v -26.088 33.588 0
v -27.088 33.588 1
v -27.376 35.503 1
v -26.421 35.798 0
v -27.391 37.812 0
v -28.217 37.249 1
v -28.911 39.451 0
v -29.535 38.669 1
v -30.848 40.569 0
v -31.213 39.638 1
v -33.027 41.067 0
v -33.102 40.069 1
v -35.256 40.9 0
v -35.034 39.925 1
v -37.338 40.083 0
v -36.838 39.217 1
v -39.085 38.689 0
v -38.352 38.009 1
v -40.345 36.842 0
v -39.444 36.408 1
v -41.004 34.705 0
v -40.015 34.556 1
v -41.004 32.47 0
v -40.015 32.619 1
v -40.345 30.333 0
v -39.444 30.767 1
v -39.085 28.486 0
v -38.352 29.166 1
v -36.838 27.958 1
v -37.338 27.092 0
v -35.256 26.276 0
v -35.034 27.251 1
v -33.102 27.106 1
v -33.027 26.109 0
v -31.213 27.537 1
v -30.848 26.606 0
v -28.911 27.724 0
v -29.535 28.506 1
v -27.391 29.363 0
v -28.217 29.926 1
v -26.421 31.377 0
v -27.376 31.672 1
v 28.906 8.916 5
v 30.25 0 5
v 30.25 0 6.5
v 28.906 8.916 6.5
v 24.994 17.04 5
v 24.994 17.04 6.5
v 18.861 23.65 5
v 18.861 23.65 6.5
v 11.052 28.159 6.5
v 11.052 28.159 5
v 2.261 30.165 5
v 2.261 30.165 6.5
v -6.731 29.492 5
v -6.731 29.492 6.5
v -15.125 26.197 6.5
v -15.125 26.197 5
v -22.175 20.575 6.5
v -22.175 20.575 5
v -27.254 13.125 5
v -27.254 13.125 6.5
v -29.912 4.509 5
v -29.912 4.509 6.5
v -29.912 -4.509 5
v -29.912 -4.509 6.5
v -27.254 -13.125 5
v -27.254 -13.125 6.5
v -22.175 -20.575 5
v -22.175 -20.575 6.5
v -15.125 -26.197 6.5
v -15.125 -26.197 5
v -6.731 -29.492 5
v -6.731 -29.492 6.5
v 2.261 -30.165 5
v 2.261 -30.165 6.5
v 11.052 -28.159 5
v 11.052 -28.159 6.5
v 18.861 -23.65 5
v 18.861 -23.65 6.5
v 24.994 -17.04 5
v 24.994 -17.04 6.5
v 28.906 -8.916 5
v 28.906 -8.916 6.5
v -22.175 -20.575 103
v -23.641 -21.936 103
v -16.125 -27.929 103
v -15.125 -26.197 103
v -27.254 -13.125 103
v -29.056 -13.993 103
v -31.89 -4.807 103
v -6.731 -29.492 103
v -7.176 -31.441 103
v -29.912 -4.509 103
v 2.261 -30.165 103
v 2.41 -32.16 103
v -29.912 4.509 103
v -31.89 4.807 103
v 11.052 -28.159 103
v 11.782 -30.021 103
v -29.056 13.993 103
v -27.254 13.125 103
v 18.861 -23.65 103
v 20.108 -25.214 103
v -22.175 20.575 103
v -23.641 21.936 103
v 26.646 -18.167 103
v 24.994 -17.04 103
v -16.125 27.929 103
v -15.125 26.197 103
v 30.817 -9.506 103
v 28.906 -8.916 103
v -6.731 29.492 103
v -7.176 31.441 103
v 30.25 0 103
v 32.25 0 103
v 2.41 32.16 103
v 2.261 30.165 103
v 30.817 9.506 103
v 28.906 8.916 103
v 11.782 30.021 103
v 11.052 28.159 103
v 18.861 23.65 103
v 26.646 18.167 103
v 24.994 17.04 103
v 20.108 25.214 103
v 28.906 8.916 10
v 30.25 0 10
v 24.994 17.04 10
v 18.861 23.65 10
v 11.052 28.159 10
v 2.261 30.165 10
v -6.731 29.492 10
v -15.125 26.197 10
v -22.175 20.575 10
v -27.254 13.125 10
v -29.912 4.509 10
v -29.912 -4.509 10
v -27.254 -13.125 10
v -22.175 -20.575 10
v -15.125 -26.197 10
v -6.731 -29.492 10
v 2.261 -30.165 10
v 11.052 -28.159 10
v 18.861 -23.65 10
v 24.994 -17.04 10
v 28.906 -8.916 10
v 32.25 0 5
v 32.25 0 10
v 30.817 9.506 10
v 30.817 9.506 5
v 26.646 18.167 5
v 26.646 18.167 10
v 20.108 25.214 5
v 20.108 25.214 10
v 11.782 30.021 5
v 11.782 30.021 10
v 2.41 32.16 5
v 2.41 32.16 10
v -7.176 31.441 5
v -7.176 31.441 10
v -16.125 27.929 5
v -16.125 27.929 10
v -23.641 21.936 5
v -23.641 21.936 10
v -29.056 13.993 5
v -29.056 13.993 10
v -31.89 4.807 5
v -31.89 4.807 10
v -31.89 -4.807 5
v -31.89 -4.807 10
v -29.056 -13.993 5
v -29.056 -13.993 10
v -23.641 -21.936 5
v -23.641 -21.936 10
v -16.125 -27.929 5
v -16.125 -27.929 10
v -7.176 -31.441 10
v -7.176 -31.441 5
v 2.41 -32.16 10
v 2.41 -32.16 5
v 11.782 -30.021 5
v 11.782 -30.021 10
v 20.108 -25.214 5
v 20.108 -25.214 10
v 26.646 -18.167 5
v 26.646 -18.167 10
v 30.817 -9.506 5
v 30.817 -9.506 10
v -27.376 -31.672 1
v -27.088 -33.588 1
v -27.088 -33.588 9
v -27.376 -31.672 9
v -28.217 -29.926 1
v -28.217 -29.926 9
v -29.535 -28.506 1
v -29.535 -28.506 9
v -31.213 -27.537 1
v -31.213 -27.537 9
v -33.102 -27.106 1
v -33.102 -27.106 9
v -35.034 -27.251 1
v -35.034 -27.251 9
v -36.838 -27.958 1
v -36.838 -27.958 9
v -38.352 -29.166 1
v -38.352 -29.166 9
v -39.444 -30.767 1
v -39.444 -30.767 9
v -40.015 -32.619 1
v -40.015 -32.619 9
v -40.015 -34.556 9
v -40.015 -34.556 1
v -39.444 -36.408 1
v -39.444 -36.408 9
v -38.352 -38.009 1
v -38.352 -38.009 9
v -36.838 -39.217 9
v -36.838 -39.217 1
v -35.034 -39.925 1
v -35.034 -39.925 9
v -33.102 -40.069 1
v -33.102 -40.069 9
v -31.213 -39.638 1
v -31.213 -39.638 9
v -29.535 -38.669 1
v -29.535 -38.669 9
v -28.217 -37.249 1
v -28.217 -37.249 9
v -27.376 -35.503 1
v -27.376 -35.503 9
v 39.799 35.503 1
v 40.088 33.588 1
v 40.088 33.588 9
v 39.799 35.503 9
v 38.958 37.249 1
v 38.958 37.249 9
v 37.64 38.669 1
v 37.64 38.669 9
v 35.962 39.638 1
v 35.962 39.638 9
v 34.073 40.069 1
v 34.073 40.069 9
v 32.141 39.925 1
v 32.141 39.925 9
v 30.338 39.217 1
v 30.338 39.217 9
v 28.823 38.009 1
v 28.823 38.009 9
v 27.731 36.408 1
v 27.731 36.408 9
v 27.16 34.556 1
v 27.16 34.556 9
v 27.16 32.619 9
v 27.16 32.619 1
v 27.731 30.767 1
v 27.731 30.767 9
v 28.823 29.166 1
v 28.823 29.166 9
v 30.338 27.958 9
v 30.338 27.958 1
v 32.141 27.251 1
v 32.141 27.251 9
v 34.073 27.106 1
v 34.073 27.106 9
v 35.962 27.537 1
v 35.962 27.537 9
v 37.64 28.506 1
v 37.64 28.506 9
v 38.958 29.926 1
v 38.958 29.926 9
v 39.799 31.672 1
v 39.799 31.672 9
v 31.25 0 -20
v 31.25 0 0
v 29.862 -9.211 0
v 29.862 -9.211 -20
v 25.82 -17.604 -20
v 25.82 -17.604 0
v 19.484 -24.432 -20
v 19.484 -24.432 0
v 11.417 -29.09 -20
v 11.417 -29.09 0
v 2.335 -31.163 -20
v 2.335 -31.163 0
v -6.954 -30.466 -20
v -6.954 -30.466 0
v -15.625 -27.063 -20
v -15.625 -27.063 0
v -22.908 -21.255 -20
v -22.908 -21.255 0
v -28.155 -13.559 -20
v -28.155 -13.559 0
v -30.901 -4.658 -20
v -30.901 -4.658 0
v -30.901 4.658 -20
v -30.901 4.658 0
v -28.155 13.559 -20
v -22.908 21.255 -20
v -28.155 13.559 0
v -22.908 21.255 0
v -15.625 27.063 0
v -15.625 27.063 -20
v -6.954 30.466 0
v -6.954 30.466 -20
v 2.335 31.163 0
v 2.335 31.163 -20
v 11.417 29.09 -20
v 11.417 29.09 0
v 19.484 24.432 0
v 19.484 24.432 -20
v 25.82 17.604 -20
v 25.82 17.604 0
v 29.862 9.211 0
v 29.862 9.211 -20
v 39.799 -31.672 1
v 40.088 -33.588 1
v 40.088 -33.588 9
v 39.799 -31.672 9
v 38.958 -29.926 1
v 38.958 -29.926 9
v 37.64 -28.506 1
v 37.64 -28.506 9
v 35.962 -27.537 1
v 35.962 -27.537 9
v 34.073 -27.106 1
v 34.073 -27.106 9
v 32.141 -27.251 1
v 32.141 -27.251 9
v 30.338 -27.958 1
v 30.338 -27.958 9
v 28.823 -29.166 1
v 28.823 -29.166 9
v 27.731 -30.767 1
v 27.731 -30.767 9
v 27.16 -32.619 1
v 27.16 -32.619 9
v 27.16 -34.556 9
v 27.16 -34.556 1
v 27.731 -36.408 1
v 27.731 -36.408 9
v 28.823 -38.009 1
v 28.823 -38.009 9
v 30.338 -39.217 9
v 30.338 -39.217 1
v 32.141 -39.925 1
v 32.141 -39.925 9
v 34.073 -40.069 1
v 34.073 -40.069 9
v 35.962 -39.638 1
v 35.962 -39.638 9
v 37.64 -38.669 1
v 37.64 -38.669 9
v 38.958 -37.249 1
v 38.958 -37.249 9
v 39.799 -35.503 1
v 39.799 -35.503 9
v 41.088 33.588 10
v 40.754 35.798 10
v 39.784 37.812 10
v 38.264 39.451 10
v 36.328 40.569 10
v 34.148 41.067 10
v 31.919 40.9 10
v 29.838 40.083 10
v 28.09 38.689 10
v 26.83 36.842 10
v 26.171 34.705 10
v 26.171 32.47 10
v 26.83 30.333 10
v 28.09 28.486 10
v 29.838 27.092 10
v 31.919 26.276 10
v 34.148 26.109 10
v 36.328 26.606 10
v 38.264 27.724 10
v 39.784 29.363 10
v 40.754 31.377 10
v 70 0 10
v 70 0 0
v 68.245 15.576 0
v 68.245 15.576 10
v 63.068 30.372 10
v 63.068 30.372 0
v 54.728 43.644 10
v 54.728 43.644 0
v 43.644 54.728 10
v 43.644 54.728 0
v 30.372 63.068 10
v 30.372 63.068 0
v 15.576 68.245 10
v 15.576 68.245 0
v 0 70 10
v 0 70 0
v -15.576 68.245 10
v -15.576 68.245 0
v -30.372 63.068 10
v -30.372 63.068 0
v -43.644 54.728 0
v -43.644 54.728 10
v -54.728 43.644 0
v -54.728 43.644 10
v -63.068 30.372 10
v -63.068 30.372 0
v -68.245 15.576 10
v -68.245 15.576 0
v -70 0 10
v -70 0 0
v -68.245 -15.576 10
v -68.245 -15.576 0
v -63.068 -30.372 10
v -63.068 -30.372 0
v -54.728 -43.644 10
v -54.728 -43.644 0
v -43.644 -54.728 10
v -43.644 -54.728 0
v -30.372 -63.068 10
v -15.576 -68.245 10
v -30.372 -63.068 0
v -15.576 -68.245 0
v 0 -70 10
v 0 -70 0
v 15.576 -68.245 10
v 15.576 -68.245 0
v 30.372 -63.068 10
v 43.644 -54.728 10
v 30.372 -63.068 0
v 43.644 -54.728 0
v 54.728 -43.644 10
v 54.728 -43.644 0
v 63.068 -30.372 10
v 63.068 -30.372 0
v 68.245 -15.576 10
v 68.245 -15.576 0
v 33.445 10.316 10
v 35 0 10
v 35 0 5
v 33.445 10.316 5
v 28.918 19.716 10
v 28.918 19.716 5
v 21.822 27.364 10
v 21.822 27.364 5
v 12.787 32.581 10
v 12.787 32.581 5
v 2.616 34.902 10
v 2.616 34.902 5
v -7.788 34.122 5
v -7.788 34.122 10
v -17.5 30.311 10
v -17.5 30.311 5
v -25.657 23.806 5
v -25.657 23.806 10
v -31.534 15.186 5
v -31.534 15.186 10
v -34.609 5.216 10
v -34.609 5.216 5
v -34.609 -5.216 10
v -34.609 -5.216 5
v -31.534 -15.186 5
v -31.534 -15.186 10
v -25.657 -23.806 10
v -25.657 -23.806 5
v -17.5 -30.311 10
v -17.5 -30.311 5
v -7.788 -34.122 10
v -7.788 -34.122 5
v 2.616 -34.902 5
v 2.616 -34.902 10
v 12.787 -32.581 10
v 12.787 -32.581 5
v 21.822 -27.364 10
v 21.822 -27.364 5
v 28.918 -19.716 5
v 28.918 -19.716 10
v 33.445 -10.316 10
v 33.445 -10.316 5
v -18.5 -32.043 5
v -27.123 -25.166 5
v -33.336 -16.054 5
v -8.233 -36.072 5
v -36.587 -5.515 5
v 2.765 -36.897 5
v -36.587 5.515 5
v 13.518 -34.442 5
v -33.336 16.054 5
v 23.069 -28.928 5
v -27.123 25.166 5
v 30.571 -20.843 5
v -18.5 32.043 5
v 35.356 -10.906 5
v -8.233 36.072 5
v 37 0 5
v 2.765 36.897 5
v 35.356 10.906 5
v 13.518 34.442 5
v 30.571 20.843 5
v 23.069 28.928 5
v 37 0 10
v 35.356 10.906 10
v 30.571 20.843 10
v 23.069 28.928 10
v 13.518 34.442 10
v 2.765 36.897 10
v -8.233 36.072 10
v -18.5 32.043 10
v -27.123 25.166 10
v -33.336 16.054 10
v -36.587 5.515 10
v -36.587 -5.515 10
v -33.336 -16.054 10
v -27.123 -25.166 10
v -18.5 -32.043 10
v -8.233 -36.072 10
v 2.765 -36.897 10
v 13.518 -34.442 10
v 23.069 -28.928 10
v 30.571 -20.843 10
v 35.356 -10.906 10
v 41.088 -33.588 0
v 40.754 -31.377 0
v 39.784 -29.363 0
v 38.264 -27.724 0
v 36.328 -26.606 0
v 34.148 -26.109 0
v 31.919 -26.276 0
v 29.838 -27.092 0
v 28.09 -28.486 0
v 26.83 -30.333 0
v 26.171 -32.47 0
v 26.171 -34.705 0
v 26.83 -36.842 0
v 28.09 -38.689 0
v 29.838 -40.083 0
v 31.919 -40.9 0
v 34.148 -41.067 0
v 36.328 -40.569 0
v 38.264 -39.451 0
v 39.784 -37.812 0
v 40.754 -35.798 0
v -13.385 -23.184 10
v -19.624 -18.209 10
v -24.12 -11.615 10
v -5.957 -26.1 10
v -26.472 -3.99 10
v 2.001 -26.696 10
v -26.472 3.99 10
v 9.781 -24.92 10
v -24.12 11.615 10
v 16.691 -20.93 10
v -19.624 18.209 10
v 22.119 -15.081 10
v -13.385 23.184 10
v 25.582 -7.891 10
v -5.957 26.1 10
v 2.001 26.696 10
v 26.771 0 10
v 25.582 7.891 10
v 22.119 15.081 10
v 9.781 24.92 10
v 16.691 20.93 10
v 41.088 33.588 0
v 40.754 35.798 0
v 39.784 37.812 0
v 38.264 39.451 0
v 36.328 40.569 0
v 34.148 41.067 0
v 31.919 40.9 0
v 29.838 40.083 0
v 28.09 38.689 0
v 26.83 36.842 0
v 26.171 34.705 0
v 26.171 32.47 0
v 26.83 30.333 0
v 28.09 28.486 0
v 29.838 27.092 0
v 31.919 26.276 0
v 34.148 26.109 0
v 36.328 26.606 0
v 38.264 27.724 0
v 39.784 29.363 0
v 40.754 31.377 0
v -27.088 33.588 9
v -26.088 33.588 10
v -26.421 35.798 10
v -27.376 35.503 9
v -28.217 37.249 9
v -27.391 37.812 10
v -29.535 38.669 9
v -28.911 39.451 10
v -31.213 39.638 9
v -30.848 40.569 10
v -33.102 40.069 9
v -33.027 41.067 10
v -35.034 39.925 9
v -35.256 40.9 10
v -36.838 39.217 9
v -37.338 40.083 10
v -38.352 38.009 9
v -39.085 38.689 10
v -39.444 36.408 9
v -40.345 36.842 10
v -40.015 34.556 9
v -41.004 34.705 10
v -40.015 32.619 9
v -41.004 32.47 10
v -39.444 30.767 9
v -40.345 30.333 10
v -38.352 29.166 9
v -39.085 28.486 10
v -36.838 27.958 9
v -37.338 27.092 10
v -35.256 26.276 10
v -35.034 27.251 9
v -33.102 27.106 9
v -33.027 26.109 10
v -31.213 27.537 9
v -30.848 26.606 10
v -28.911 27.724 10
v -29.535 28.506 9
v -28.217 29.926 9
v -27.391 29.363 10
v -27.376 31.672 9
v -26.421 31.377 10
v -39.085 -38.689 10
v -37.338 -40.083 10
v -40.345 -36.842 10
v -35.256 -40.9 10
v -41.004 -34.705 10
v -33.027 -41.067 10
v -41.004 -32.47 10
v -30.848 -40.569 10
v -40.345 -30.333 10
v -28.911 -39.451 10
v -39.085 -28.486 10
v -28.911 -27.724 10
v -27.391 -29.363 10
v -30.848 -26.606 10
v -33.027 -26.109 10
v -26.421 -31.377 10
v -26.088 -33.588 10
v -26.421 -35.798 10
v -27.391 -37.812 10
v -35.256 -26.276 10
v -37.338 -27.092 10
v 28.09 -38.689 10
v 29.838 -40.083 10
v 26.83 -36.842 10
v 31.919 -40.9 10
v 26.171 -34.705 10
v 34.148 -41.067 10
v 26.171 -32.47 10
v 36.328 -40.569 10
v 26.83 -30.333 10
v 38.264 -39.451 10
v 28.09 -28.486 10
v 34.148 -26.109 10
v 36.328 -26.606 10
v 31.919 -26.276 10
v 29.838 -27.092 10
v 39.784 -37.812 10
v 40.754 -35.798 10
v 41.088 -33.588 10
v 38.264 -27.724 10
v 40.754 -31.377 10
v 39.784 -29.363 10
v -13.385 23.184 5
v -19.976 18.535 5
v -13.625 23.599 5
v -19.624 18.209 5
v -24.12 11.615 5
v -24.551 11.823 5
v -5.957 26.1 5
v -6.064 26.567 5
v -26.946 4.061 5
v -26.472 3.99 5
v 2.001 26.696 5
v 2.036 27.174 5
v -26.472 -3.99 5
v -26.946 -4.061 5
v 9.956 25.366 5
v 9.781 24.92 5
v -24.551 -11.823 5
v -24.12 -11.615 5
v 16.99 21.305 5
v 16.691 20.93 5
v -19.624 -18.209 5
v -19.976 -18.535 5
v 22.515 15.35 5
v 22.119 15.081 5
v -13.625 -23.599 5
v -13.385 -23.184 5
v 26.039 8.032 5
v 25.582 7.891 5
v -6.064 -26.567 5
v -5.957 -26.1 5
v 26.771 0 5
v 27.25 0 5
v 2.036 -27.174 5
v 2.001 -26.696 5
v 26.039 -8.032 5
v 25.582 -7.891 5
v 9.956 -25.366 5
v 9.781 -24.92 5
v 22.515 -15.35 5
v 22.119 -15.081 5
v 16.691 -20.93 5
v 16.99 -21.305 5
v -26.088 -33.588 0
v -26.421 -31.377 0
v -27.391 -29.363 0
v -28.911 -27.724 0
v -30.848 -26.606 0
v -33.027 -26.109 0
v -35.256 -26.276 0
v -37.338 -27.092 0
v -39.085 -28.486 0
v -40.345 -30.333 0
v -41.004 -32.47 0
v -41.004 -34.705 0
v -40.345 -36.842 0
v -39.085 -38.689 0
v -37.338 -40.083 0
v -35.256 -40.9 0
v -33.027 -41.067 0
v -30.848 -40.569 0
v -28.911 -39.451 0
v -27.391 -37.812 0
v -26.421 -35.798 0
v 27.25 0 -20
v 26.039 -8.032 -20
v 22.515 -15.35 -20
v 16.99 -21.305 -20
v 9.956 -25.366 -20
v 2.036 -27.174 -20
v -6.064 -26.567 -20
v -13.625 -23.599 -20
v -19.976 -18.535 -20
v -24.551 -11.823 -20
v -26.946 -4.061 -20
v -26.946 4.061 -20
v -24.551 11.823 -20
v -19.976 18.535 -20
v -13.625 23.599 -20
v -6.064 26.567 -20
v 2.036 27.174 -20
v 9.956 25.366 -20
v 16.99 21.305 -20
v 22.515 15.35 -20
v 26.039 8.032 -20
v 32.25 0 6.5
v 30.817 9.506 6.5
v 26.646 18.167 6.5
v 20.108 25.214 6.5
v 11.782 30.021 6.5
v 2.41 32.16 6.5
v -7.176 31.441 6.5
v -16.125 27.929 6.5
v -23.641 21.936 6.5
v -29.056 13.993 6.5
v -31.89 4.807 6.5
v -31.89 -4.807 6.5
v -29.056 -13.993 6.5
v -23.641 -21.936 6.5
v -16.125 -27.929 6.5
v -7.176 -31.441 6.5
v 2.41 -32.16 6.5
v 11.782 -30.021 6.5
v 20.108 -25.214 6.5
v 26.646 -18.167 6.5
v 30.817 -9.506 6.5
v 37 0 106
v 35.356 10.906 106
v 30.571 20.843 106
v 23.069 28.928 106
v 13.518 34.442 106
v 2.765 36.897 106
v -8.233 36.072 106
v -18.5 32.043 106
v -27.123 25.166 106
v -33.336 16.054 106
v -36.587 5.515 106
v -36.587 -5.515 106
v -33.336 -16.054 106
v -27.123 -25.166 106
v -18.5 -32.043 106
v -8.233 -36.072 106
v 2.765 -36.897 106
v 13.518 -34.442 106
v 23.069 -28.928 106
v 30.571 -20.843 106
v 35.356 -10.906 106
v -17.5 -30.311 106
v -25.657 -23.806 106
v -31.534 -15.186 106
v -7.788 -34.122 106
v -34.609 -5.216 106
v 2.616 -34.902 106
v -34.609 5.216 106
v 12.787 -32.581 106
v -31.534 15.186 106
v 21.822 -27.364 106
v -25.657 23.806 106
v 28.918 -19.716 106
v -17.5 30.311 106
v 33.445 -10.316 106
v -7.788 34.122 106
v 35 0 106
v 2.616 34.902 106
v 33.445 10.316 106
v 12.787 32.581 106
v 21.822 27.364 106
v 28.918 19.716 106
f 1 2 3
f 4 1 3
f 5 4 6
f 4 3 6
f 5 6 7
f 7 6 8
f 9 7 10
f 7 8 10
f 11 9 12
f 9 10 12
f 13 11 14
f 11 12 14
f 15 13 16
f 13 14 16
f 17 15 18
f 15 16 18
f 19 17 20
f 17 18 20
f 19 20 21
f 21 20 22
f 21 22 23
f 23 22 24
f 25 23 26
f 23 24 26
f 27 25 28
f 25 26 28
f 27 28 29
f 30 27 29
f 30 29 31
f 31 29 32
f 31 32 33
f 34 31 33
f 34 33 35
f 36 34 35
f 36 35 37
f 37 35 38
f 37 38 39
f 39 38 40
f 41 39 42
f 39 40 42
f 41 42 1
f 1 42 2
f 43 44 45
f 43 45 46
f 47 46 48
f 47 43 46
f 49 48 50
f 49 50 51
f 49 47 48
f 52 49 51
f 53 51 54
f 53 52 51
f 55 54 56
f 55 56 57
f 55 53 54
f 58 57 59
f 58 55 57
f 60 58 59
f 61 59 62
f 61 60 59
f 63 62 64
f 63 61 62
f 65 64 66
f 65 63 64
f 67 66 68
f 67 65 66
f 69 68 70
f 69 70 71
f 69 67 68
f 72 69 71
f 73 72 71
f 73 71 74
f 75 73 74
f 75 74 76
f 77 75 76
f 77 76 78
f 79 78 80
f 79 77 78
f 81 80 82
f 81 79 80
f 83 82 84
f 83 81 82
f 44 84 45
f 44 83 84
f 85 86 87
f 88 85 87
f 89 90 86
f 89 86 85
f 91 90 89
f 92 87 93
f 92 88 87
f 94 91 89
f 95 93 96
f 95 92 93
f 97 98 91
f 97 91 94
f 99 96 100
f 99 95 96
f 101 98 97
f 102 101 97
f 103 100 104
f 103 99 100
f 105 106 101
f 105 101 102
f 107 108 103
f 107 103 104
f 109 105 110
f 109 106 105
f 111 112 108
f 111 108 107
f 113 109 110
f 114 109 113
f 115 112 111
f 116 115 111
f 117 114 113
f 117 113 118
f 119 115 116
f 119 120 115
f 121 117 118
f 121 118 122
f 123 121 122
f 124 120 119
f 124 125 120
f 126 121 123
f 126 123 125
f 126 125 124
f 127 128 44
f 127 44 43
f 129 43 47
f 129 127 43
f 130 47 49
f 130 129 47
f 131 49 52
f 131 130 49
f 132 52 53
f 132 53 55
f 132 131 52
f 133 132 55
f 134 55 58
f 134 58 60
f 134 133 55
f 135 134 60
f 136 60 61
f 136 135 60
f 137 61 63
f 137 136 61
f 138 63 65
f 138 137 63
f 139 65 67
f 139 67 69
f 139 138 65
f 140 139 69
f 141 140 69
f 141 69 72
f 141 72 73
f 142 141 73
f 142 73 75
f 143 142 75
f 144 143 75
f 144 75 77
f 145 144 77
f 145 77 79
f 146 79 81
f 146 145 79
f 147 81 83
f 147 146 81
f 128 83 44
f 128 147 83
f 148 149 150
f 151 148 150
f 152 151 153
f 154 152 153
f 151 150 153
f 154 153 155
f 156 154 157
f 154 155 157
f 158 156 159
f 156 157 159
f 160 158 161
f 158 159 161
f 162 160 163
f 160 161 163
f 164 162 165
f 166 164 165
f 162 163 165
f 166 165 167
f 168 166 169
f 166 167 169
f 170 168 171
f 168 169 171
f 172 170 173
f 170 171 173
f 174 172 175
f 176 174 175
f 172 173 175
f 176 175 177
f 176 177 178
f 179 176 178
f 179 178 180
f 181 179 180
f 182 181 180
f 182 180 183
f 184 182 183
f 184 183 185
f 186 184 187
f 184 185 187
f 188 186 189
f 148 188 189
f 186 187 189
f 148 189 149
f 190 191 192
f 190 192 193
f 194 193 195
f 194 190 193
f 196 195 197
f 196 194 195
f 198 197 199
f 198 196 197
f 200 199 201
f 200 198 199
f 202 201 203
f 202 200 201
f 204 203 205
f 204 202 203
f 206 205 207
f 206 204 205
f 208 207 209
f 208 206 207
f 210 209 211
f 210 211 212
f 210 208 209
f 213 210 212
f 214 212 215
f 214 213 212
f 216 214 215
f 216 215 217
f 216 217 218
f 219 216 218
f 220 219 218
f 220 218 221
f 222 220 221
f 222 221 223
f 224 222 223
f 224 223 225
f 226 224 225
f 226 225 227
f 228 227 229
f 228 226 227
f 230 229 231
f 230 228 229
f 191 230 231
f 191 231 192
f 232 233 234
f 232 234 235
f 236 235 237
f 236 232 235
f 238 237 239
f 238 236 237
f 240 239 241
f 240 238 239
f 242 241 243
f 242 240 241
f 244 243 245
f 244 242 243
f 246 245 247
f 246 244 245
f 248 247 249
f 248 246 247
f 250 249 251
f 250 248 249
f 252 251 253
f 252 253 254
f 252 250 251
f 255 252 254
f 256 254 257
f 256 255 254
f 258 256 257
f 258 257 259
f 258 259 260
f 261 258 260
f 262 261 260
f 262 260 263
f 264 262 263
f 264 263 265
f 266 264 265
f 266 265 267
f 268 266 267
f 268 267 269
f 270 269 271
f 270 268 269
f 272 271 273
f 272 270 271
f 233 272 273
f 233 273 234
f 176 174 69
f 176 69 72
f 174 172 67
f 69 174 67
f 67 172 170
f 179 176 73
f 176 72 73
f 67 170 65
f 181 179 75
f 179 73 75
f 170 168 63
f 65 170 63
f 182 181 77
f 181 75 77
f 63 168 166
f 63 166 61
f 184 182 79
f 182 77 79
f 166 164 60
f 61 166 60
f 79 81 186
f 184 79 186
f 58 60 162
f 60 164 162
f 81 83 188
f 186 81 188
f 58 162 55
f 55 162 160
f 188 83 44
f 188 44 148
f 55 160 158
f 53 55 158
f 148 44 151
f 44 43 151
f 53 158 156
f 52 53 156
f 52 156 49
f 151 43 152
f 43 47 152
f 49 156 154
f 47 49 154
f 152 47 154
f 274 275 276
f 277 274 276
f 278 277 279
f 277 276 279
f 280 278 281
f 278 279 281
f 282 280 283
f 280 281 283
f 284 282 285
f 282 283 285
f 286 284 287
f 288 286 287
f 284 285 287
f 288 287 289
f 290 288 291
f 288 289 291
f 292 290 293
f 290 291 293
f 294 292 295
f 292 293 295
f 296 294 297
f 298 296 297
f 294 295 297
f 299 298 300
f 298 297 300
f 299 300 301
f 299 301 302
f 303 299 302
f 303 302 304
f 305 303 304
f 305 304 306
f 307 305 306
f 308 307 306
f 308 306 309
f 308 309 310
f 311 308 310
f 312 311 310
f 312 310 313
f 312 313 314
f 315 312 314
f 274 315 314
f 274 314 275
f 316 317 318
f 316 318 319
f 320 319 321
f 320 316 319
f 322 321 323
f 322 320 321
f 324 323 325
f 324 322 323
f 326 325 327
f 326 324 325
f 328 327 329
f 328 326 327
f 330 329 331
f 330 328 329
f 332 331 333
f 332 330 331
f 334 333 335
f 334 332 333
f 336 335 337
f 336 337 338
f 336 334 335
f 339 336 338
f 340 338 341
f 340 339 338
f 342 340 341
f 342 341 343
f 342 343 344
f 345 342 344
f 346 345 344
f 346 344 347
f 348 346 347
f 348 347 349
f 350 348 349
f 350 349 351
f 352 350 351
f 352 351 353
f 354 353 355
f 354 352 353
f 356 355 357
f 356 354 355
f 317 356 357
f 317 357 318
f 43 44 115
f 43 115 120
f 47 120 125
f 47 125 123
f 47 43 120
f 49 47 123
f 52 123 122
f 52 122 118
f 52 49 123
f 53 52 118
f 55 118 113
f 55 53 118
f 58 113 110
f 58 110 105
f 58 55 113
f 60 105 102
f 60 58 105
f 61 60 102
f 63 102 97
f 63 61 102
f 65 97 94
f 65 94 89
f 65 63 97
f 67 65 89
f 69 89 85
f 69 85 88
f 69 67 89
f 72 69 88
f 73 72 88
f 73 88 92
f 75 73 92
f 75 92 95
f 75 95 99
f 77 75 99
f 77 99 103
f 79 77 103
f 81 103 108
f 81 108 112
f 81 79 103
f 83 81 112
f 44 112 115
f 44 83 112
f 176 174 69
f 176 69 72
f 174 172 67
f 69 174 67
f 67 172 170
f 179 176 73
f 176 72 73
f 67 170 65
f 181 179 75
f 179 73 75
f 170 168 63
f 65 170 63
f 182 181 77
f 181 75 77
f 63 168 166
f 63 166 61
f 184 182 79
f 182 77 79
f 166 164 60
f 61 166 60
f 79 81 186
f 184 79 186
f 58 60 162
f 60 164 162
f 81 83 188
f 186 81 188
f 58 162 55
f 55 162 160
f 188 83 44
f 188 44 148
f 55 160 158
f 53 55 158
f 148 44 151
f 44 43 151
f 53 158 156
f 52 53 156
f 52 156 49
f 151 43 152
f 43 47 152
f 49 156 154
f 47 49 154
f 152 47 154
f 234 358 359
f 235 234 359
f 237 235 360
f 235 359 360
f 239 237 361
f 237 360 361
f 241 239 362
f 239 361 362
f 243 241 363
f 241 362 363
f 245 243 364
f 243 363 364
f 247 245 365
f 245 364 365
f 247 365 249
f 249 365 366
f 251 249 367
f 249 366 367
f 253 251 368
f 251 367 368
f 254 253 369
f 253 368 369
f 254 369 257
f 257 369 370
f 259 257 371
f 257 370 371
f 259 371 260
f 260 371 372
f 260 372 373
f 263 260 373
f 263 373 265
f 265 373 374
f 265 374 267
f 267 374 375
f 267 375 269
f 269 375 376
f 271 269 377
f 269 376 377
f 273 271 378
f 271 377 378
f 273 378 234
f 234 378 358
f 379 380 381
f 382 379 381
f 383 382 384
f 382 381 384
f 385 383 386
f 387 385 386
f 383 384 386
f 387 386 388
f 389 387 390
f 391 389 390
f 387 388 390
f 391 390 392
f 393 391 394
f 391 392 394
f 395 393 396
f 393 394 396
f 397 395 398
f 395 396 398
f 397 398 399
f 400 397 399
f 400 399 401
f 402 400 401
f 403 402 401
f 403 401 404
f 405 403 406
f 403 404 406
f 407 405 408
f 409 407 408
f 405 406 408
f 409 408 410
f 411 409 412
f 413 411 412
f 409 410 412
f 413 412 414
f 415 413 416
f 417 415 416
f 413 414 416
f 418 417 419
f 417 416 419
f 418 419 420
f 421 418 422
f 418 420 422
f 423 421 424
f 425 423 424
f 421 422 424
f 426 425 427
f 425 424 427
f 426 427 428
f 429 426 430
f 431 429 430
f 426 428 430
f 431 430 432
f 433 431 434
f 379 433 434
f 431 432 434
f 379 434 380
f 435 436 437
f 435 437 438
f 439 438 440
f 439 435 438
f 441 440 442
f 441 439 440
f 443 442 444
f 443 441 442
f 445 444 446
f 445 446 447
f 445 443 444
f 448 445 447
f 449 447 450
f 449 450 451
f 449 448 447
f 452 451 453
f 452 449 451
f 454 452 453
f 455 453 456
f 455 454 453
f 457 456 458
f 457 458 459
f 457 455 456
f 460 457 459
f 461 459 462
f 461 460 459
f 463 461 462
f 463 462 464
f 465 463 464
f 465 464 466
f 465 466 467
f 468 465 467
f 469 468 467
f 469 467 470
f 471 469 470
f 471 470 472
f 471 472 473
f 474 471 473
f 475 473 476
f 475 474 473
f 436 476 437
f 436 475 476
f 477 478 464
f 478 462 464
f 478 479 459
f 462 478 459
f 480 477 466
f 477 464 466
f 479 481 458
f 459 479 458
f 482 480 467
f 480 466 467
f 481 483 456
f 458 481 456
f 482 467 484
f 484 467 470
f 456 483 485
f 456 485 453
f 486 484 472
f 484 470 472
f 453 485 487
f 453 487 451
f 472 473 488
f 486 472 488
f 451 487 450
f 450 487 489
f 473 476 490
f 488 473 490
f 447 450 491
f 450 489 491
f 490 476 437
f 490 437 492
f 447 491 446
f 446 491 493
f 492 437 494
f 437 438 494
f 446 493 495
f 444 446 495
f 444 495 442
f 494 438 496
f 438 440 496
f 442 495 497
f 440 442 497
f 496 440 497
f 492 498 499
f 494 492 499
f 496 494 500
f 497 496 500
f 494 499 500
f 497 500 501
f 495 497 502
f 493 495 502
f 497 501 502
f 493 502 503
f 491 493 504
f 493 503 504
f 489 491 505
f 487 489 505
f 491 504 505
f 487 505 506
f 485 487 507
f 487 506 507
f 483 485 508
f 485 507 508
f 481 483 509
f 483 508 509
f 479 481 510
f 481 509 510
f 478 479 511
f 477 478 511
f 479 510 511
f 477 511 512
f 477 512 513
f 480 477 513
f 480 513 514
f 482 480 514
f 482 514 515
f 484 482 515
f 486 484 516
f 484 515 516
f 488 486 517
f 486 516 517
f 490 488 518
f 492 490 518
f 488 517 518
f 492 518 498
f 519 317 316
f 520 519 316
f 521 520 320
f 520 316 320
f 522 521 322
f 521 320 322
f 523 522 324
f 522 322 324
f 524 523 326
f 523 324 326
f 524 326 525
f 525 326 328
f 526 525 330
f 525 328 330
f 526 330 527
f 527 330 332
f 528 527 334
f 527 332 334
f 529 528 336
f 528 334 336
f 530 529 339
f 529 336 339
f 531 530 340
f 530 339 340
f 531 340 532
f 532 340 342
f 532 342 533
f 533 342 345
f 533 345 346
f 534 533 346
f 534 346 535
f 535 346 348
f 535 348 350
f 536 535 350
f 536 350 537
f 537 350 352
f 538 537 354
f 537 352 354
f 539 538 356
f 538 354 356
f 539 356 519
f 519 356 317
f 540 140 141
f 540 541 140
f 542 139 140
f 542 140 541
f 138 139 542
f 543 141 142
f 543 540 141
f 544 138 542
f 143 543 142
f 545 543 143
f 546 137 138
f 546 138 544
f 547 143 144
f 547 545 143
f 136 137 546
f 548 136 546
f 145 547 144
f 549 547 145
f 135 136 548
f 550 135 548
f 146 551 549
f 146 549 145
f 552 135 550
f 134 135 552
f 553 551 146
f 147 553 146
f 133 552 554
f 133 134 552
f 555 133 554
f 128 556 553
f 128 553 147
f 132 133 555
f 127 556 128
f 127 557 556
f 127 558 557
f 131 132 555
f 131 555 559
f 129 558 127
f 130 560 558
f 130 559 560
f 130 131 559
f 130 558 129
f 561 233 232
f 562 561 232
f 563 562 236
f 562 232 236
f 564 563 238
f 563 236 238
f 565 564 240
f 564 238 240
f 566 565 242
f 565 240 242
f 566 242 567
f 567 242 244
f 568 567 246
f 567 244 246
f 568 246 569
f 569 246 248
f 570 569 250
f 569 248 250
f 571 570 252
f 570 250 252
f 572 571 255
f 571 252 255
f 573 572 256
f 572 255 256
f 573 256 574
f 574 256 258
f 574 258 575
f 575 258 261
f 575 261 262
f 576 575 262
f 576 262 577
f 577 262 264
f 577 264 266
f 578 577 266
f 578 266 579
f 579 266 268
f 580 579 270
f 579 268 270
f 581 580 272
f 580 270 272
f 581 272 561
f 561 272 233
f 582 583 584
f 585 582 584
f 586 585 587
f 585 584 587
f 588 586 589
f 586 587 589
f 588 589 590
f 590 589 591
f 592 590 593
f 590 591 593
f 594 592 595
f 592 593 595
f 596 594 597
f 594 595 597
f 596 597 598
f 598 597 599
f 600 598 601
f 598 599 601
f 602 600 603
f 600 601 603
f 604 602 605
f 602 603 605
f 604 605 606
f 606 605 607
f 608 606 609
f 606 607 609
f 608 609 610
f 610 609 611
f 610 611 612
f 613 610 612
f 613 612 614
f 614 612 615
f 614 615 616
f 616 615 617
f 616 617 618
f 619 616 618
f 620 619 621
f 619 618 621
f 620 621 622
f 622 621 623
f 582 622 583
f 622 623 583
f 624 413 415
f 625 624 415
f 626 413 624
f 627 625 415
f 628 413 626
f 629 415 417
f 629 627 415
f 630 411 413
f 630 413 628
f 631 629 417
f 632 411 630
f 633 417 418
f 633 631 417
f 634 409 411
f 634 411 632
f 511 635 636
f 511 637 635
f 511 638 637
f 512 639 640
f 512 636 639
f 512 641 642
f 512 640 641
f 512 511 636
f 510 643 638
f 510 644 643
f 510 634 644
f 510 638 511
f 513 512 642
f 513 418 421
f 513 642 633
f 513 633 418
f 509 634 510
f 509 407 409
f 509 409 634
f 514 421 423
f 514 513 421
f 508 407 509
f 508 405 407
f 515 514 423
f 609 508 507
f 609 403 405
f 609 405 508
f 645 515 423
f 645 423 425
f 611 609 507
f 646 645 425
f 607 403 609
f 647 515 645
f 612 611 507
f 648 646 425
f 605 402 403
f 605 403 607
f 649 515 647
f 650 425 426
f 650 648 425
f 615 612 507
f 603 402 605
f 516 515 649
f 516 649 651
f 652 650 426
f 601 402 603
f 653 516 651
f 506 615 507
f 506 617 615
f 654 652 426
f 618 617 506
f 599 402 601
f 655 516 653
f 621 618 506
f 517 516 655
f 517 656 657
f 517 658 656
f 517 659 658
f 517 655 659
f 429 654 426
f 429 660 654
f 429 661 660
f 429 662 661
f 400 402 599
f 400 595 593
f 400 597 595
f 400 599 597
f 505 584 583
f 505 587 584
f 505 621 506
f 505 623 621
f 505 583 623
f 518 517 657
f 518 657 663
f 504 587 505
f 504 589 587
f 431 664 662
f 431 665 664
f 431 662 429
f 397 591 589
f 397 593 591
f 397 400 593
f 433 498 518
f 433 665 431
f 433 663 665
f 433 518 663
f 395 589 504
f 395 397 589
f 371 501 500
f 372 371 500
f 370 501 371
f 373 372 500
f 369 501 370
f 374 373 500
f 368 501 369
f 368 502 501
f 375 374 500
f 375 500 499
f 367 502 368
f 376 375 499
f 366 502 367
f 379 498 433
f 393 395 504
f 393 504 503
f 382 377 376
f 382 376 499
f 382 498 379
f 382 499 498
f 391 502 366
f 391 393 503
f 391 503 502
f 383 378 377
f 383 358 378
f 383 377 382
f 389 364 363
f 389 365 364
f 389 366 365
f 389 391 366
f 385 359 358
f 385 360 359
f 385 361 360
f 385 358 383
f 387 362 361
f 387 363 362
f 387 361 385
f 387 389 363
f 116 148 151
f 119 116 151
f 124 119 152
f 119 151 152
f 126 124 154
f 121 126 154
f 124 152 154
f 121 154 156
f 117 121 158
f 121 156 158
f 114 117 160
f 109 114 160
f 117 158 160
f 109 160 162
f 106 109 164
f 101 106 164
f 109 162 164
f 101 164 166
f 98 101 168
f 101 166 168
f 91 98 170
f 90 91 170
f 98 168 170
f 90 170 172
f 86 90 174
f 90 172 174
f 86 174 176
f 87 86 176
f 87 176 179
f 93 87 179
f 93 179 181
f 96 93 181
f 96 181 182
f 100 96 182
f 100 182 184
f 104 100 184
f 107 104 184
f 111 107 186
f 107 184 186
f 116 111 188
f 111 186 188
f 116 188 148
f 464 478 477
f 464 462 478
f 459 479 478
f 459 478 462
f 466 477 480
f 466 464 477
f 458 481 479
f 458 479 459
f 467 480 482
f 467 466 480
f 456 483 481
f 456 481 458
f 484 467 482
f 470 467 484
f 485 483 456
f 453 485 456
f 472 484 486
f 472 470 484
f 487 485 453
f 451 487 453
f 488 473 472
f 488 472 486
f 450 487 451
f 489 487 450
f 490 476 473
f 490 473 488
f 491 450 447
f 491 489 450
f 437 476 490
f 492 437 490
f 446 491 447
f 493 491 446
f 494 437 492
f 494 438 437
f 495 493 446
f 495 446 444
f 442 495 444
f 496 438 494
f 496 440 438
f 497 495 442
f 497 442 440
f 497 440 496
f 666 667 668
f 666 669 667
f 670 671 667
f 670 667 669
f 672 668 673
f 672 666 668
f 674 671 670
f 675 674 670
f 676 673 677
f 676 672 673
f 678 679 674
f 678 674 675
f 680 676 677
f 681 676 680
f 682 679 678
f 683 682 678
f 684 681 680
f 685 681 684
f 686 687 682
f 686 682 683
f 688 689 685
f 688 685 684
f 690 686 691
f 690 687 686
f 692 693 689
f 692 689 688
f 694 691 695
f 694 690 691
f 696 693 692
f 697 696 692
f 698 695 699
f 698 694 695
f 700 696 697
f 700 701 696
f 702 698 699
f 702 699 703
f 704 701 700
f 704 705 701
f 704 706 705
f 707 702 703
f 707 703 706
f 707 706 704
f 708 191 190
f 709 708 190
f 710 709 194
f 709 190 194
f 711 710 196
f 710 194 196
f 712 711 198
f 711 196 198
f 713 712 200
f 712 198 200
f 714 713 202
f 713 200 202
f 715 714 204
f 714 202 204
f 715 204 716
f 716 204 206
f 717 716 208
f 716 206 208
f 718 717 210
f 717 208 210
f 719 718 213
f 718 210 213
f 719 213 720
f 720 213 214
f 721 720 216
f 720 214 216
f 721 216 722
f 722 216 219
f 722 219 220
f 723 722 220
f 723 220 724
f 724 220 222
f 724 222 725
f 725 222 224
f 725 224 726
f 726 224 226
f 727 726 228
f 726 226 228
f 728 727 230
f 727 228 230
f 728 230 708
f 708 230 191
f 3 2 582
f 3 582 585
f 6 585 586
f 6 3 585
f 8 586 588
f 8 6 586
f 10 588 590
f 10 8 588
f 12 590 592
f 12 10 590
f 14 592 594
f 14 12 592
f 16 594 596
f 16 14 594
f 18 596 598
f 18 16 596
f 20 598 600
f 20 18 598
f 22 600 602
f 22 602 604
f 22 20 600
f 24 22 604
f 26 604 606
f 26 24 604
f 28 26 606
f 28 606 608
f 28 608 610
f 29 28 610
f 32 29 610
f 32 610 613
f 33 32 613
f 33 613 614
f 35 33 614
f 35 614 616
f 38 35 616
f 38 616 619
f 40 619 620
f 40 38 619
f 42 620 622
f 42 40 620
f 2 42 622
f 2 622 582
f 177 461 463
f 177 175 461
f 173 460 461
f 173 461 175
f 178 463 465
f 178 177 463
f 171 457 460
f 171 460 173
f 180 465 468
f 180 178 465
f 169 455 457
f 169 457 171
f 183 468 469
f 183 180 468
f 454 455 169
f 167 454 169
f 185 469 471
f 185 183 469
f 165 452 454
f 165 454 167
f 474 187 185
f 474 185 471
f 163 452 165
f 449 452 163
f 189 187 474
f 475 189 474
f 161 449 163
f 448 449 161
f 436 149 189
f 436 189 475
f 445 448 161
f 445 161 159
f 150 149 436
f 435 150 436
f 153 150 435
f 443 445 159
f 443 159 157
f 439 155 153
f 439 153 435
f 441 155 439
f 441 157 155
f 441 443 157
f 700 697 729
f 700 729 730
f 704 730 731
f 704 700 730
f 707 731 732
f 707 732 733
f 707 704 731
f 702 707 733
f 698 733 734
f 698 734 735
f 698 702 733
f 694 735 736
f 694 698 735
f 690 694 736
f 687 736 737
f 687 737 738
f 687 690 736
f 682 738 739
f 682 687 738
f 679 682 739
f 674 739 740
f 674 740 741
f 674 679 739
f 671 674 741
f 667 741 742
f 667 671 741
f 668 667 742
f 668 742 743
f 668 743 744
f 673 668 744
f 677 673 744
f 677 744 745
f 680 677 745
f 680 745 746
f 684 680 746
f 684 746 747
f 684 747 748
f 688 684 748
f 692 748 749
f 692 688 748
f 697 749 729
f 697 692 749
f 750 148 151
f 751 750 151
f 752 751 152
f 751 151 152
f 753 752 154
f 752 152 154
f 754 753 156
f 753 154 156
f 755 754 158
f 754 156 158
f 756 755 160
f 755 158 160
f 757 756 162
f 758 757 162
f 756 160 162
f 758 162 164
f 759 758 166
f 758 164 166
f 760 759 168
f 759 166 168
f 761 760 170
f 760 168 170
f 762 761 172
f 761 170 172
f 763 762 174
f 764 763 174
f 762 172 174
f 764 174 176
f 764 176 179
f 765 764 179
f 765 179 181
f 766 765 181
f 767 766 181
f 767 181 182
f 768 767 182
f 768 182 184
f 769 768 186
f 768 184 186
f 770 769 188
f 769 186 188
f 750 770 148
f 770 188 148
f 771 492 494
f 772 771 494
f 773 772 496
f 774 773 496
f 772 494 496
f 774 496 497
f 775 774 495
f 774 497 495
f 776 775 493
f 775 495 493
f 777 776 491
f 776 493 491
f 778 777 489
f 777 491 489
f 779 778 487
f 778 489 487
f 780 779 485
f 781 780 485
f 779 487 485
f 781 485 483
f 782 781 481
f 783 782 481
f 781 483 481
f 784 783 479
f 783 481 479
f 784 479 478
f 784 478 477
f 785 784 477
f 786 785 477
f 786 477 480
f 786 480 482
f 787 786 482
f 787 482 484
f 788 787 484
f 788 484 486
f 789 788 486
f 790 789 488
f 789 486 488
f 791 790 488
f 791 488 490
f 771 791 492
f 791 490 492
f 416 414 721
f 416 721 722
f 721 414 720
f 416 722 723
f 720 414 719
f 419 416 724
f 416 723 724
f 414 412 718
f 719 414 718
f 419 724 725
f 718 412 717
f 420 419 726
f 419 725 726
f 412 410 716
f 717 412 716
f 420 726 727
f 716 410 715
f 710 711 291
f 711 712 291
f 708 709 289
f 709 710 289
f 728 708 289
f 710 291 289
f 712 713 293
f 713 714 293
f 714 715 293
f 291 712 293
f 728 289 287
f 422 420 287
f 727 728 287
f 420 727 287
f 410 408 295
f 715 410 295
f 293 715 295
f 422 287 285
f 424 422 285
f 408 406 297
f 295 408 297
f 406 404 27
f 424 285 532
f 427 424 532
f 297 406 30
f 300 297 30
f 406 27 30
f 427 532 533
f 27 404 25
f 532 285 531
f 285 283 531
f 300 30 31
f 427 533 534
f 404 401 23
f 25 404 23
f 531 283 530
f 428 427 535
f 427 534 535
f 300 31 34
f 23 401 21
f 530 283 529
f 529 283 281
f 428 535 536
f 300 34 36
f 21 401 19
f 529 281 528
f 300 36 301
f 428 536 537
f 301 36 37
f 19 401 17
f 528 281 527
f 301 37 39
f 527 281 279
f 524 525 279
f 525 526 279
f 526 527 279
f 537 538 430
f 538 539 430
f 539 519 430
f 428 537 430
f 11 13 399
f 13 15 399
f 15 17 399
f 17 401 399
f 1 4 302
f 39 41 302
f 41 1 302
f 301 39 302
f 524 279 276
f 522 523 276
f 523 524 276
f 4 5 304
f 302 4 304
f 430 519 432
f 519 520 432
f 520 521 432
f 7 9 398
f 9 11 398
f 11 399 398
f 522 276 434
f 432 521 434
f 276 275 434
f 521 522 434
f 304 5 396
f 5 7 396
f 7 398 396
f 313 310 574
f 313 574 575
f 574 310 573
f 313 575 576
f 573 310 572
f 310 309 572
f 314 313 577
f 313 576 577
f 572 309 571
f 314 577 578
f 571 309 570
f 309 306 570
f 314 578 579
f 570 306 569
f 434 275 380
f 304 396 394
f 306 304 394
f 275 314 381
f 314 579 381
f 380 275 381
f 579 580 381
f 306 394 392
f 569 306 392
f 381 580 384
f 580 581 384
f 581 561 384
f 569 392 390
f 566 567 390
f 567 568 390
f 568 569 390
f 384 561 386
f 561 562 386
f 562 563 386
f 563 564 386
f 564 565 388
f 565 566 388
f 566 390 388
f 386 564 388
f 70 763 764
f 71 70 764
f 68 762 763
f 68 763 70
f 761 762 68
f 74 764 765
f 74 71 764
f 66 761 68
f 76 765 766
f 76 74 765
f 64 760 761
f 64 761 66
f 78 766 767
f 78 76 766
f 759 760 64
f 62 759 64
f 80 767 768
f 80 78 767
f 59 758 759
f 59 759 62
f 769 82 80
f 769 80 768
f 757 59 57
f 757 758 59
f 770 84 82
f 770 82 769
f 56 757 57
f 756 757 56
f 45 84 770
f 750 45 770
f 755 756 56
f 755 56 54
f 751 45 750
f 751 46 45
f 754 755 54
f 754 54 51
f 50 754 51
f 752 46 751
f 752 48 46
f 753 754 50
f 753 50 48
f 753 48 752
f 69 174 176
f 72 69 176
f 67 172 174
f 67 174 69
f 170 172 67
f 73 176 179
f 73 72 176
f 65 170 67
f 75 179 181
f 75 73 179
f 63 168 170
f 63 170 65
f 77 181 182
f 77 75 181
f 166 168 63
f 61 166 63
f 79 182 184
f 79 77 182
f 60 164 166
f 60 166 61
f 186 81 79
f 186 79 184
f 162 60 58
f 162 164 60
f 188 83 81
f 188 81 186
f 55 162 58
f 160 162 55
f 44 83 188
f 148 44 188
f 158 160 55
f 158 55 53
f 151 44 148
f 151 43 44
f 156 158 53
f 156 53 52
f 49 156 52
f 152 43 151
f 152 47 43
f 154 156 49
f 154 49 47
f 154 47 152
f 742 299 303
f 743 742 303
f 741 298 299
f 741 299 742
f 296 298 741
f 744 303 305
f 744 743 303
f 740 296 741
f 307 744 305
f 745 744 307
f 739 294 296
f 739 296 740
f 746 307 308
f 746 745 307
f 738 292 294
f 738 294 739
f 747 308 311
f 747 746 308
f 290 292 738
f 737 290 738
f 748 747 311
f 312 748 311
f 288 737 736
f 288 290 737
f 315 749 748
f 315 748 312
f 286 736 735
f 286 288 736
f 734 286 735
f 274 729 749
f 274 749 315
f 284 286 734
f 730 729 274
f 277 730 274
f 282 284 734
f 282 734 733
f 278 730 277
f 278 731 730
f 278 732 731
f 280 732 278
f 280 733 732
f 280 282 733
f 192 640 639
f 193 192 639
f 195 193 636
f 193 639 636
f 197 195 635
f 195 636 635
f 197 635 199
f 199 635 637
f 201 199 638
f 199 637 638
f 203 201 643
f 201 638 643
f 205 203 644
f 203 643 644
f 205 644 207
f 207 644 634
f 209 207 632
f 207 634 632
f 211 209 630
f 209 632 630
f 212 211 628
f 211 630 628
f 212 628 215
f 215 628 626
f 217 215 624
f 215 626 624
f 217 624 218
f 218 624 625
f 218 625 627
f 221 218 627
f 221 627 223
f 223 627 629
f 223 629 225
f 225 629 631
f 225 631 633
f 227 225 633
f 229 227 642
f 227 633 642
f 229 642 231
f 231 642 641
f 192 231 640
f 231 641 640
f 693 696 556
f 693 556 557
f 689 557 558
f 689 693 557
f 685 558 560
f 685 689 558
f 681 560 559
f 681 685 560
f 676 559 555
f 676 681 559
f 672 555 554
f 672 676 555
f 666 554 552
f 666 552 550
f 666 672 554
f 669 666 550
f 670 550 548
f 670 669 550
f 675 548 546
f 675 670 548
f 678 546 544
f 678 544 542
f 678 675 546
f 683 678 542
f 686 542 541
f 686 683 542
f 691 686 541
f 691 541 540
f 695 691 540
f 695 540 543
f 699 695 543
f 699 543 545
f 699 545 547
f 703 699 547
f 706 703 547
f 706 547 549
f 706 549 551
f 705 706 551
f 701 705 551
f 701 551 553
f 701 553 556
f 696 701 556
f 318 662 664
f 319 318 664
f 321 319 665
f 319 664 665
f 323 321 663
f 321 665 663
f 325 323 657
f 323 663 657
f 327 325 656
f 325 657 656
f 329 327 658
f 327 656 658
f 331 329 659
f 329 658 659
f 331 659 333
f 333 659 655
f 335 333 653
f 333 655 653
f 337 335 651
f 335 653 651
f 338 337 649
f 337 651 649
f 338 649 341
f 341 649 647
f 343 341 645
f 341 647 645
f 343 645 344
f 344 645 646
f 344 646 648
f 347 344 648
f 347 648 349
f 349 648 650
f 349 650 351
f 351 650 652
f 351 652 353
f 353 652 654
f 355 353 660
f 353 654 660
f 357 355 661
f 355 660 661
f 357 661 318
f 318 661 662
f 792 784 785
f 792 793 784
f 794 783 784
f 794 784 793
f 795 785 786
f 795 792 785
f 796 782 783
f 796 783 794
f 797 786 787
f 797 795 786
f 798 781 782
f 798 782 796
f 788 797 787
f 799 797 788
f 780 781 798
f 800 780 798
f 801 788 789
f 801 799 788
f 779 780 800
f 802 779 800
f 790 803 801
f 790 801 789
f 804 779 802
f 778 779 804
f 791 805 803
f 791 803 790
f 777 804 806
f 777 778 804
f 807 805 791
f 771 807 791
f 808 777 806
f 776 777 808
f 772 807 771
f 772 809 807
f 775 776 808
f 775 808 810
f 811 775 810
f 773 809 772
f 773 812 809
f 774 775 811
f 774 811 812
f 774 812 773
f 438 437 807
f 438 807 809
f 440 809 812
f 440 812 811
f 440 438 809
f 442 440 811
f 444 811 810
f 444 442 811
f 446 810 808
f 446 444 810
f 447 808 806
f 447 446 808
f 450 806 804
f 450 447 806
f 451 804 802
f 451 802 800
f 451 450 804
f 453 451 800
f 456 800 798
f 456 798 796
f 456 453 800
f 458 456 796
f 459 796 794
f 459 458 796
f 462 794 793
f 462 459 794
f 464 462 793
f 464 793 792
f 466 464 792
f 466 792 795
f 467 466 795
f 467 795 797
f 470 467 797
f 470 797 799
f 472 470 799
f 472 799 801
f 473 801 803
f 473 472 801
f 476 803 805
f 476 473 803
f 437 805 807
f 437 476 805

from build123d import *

# Parameters (mm, degrees)
F0_R      = 70
F0_R_2    = 6.5
F0_R_3    = 26.7709117697
F1_DEPTH  = 10
F2_R      = 30.15
F3_DEPTH  = 5
F4_R      = 31.25
F4_R_2    = 27.25
F5_DEPTH  = 25
F6_SIZE   = 1
F7_R      = 32.25
F7_R_2    = 30.25
F8_DEPTH  = 5
F9_R      = 37
F9_R_2    = 35
F10_DEPTH = 5
F11_R     = 32.25
F11_R_2   = 30.25
F12_DEPTH = 98
F13_R     = 37
F13_R_2   = 35
F14_DEPTH = 101
F15_R     = 32.25
F15_R_2   = 30.25
F16_DEPTH = 1.5


with BuildPart() as f1:
    # F0 (on Top) → F1 (new body)
    with BuildSketch(Plane.XY):
        Circle(F0_R)
        with Locations((-33.5875721064, -33.5875721064)):
            Circle(F0_R_2, mode=Mode.SUBTRACT)
        with Locations((33.5875721064, -33.5875721064)):
            Circle(F0_R_2, mode=Mode.SUBTRACT)
        with Locations((-33.5875721064, 33.5875721064)):
            Circle(F0_R_2, mode=Mode.SUBTRACT)
        Circle(F0_R_3, mode=Mode.SUBTRACT)
        with Locations((33.5875721064, 33.5875721064)):
            Circle(F0_R_2, mode=Mode.SUBTRACT)
    extrude(amount=F1_DEPTH)

    # F2 (on face) → F3 (cut)
    with BuildSketch(Plane(origin=(0, 0, 0), x_dir=(1, 0, 0), z_dir=(0, 0, -1))):
        Circle(F2_R)
    extrude(amount=-F3_DEPTH, mode=Mode.SUBTRACT)

    # F4 (on face) → F5 (join)
    with BuildSketch(Plane(origin=(0, 0, 5), x_dir=(1, 0, 0), z_dir=(0, 0, -1))):
        Circle(F4_R)
        Circle(F4_R_2, mode=Mode.SUBTRACT)
    extrude(amount=F5_DEPTH)

    # F6
    f6_edges = [f1.edges().sort_by_distance(p)[0] for p in [
        (-40.087572, 33.587572, 0),
        (27.087572, 33.587572, 0),
        (27.087572, -33.587572, 0),
        (-40.087572, -33.587572, 0),
        (27.087572, 33.587572, 10),
        (27.087572, -33.587572, 10),
        (-40.087572, -33.587572, 10),
        (-40.087572, 33.587572, 10),
    ]]
    chamfer(f6_edges, length=F6_SIZE)

    # F7 (on face) → F8 (cut)
    with BuildSketch(Plane.XY.offset(10)):
        Circle(F7_R)
        Circle(F7_R_2, mode=Mode.SUBTRACT)
    extrude(amount=-F8_DEPTH, mode=Mode.SUBTRACT)

    # F9 (on face) → F10 (cut)
    with BuildSketch(Plane.XY.offset(10)):
        Circle(F9_R)
        Circle(F9_R_2, mode=Mode.SUBTRACT)
    extrude(amount=-F10_DEPTH, mode=Mode.SUBTRACT)


with BuildPart() as f12:
    # F11 (on face) → F12 (new body)
    with BuildSketch(Plane.XY.offset(5)):
        Circle(F11_R)
        Circle(F11_R_2, mode=Mode.SUBTRACT)
    extrude(amount=F12_DEPTH)


with BuildPart() as f14:
    # F13 (on face) → F14 (new body)
    with BuildSketch(Plane.XY.offset(5)):
        Circle(F13_R)
        Circle(F13_R_2, mode=Mode.SUBTRACT)
    extrude(amount=F14_DEPTH)


with BuildPart() as f16:
    # F15 (on face) → F16 (new body)
    with BuildSketch(Plane.XY.offset(5)):
        Circle(F15_R)
        Circle(F15_R_2, mode=Mode.SUBTRACT)
    extrude(amount=F16_DEPTH)


solid = Compound([f1.part, f12.part, f14.part, f16.part])
